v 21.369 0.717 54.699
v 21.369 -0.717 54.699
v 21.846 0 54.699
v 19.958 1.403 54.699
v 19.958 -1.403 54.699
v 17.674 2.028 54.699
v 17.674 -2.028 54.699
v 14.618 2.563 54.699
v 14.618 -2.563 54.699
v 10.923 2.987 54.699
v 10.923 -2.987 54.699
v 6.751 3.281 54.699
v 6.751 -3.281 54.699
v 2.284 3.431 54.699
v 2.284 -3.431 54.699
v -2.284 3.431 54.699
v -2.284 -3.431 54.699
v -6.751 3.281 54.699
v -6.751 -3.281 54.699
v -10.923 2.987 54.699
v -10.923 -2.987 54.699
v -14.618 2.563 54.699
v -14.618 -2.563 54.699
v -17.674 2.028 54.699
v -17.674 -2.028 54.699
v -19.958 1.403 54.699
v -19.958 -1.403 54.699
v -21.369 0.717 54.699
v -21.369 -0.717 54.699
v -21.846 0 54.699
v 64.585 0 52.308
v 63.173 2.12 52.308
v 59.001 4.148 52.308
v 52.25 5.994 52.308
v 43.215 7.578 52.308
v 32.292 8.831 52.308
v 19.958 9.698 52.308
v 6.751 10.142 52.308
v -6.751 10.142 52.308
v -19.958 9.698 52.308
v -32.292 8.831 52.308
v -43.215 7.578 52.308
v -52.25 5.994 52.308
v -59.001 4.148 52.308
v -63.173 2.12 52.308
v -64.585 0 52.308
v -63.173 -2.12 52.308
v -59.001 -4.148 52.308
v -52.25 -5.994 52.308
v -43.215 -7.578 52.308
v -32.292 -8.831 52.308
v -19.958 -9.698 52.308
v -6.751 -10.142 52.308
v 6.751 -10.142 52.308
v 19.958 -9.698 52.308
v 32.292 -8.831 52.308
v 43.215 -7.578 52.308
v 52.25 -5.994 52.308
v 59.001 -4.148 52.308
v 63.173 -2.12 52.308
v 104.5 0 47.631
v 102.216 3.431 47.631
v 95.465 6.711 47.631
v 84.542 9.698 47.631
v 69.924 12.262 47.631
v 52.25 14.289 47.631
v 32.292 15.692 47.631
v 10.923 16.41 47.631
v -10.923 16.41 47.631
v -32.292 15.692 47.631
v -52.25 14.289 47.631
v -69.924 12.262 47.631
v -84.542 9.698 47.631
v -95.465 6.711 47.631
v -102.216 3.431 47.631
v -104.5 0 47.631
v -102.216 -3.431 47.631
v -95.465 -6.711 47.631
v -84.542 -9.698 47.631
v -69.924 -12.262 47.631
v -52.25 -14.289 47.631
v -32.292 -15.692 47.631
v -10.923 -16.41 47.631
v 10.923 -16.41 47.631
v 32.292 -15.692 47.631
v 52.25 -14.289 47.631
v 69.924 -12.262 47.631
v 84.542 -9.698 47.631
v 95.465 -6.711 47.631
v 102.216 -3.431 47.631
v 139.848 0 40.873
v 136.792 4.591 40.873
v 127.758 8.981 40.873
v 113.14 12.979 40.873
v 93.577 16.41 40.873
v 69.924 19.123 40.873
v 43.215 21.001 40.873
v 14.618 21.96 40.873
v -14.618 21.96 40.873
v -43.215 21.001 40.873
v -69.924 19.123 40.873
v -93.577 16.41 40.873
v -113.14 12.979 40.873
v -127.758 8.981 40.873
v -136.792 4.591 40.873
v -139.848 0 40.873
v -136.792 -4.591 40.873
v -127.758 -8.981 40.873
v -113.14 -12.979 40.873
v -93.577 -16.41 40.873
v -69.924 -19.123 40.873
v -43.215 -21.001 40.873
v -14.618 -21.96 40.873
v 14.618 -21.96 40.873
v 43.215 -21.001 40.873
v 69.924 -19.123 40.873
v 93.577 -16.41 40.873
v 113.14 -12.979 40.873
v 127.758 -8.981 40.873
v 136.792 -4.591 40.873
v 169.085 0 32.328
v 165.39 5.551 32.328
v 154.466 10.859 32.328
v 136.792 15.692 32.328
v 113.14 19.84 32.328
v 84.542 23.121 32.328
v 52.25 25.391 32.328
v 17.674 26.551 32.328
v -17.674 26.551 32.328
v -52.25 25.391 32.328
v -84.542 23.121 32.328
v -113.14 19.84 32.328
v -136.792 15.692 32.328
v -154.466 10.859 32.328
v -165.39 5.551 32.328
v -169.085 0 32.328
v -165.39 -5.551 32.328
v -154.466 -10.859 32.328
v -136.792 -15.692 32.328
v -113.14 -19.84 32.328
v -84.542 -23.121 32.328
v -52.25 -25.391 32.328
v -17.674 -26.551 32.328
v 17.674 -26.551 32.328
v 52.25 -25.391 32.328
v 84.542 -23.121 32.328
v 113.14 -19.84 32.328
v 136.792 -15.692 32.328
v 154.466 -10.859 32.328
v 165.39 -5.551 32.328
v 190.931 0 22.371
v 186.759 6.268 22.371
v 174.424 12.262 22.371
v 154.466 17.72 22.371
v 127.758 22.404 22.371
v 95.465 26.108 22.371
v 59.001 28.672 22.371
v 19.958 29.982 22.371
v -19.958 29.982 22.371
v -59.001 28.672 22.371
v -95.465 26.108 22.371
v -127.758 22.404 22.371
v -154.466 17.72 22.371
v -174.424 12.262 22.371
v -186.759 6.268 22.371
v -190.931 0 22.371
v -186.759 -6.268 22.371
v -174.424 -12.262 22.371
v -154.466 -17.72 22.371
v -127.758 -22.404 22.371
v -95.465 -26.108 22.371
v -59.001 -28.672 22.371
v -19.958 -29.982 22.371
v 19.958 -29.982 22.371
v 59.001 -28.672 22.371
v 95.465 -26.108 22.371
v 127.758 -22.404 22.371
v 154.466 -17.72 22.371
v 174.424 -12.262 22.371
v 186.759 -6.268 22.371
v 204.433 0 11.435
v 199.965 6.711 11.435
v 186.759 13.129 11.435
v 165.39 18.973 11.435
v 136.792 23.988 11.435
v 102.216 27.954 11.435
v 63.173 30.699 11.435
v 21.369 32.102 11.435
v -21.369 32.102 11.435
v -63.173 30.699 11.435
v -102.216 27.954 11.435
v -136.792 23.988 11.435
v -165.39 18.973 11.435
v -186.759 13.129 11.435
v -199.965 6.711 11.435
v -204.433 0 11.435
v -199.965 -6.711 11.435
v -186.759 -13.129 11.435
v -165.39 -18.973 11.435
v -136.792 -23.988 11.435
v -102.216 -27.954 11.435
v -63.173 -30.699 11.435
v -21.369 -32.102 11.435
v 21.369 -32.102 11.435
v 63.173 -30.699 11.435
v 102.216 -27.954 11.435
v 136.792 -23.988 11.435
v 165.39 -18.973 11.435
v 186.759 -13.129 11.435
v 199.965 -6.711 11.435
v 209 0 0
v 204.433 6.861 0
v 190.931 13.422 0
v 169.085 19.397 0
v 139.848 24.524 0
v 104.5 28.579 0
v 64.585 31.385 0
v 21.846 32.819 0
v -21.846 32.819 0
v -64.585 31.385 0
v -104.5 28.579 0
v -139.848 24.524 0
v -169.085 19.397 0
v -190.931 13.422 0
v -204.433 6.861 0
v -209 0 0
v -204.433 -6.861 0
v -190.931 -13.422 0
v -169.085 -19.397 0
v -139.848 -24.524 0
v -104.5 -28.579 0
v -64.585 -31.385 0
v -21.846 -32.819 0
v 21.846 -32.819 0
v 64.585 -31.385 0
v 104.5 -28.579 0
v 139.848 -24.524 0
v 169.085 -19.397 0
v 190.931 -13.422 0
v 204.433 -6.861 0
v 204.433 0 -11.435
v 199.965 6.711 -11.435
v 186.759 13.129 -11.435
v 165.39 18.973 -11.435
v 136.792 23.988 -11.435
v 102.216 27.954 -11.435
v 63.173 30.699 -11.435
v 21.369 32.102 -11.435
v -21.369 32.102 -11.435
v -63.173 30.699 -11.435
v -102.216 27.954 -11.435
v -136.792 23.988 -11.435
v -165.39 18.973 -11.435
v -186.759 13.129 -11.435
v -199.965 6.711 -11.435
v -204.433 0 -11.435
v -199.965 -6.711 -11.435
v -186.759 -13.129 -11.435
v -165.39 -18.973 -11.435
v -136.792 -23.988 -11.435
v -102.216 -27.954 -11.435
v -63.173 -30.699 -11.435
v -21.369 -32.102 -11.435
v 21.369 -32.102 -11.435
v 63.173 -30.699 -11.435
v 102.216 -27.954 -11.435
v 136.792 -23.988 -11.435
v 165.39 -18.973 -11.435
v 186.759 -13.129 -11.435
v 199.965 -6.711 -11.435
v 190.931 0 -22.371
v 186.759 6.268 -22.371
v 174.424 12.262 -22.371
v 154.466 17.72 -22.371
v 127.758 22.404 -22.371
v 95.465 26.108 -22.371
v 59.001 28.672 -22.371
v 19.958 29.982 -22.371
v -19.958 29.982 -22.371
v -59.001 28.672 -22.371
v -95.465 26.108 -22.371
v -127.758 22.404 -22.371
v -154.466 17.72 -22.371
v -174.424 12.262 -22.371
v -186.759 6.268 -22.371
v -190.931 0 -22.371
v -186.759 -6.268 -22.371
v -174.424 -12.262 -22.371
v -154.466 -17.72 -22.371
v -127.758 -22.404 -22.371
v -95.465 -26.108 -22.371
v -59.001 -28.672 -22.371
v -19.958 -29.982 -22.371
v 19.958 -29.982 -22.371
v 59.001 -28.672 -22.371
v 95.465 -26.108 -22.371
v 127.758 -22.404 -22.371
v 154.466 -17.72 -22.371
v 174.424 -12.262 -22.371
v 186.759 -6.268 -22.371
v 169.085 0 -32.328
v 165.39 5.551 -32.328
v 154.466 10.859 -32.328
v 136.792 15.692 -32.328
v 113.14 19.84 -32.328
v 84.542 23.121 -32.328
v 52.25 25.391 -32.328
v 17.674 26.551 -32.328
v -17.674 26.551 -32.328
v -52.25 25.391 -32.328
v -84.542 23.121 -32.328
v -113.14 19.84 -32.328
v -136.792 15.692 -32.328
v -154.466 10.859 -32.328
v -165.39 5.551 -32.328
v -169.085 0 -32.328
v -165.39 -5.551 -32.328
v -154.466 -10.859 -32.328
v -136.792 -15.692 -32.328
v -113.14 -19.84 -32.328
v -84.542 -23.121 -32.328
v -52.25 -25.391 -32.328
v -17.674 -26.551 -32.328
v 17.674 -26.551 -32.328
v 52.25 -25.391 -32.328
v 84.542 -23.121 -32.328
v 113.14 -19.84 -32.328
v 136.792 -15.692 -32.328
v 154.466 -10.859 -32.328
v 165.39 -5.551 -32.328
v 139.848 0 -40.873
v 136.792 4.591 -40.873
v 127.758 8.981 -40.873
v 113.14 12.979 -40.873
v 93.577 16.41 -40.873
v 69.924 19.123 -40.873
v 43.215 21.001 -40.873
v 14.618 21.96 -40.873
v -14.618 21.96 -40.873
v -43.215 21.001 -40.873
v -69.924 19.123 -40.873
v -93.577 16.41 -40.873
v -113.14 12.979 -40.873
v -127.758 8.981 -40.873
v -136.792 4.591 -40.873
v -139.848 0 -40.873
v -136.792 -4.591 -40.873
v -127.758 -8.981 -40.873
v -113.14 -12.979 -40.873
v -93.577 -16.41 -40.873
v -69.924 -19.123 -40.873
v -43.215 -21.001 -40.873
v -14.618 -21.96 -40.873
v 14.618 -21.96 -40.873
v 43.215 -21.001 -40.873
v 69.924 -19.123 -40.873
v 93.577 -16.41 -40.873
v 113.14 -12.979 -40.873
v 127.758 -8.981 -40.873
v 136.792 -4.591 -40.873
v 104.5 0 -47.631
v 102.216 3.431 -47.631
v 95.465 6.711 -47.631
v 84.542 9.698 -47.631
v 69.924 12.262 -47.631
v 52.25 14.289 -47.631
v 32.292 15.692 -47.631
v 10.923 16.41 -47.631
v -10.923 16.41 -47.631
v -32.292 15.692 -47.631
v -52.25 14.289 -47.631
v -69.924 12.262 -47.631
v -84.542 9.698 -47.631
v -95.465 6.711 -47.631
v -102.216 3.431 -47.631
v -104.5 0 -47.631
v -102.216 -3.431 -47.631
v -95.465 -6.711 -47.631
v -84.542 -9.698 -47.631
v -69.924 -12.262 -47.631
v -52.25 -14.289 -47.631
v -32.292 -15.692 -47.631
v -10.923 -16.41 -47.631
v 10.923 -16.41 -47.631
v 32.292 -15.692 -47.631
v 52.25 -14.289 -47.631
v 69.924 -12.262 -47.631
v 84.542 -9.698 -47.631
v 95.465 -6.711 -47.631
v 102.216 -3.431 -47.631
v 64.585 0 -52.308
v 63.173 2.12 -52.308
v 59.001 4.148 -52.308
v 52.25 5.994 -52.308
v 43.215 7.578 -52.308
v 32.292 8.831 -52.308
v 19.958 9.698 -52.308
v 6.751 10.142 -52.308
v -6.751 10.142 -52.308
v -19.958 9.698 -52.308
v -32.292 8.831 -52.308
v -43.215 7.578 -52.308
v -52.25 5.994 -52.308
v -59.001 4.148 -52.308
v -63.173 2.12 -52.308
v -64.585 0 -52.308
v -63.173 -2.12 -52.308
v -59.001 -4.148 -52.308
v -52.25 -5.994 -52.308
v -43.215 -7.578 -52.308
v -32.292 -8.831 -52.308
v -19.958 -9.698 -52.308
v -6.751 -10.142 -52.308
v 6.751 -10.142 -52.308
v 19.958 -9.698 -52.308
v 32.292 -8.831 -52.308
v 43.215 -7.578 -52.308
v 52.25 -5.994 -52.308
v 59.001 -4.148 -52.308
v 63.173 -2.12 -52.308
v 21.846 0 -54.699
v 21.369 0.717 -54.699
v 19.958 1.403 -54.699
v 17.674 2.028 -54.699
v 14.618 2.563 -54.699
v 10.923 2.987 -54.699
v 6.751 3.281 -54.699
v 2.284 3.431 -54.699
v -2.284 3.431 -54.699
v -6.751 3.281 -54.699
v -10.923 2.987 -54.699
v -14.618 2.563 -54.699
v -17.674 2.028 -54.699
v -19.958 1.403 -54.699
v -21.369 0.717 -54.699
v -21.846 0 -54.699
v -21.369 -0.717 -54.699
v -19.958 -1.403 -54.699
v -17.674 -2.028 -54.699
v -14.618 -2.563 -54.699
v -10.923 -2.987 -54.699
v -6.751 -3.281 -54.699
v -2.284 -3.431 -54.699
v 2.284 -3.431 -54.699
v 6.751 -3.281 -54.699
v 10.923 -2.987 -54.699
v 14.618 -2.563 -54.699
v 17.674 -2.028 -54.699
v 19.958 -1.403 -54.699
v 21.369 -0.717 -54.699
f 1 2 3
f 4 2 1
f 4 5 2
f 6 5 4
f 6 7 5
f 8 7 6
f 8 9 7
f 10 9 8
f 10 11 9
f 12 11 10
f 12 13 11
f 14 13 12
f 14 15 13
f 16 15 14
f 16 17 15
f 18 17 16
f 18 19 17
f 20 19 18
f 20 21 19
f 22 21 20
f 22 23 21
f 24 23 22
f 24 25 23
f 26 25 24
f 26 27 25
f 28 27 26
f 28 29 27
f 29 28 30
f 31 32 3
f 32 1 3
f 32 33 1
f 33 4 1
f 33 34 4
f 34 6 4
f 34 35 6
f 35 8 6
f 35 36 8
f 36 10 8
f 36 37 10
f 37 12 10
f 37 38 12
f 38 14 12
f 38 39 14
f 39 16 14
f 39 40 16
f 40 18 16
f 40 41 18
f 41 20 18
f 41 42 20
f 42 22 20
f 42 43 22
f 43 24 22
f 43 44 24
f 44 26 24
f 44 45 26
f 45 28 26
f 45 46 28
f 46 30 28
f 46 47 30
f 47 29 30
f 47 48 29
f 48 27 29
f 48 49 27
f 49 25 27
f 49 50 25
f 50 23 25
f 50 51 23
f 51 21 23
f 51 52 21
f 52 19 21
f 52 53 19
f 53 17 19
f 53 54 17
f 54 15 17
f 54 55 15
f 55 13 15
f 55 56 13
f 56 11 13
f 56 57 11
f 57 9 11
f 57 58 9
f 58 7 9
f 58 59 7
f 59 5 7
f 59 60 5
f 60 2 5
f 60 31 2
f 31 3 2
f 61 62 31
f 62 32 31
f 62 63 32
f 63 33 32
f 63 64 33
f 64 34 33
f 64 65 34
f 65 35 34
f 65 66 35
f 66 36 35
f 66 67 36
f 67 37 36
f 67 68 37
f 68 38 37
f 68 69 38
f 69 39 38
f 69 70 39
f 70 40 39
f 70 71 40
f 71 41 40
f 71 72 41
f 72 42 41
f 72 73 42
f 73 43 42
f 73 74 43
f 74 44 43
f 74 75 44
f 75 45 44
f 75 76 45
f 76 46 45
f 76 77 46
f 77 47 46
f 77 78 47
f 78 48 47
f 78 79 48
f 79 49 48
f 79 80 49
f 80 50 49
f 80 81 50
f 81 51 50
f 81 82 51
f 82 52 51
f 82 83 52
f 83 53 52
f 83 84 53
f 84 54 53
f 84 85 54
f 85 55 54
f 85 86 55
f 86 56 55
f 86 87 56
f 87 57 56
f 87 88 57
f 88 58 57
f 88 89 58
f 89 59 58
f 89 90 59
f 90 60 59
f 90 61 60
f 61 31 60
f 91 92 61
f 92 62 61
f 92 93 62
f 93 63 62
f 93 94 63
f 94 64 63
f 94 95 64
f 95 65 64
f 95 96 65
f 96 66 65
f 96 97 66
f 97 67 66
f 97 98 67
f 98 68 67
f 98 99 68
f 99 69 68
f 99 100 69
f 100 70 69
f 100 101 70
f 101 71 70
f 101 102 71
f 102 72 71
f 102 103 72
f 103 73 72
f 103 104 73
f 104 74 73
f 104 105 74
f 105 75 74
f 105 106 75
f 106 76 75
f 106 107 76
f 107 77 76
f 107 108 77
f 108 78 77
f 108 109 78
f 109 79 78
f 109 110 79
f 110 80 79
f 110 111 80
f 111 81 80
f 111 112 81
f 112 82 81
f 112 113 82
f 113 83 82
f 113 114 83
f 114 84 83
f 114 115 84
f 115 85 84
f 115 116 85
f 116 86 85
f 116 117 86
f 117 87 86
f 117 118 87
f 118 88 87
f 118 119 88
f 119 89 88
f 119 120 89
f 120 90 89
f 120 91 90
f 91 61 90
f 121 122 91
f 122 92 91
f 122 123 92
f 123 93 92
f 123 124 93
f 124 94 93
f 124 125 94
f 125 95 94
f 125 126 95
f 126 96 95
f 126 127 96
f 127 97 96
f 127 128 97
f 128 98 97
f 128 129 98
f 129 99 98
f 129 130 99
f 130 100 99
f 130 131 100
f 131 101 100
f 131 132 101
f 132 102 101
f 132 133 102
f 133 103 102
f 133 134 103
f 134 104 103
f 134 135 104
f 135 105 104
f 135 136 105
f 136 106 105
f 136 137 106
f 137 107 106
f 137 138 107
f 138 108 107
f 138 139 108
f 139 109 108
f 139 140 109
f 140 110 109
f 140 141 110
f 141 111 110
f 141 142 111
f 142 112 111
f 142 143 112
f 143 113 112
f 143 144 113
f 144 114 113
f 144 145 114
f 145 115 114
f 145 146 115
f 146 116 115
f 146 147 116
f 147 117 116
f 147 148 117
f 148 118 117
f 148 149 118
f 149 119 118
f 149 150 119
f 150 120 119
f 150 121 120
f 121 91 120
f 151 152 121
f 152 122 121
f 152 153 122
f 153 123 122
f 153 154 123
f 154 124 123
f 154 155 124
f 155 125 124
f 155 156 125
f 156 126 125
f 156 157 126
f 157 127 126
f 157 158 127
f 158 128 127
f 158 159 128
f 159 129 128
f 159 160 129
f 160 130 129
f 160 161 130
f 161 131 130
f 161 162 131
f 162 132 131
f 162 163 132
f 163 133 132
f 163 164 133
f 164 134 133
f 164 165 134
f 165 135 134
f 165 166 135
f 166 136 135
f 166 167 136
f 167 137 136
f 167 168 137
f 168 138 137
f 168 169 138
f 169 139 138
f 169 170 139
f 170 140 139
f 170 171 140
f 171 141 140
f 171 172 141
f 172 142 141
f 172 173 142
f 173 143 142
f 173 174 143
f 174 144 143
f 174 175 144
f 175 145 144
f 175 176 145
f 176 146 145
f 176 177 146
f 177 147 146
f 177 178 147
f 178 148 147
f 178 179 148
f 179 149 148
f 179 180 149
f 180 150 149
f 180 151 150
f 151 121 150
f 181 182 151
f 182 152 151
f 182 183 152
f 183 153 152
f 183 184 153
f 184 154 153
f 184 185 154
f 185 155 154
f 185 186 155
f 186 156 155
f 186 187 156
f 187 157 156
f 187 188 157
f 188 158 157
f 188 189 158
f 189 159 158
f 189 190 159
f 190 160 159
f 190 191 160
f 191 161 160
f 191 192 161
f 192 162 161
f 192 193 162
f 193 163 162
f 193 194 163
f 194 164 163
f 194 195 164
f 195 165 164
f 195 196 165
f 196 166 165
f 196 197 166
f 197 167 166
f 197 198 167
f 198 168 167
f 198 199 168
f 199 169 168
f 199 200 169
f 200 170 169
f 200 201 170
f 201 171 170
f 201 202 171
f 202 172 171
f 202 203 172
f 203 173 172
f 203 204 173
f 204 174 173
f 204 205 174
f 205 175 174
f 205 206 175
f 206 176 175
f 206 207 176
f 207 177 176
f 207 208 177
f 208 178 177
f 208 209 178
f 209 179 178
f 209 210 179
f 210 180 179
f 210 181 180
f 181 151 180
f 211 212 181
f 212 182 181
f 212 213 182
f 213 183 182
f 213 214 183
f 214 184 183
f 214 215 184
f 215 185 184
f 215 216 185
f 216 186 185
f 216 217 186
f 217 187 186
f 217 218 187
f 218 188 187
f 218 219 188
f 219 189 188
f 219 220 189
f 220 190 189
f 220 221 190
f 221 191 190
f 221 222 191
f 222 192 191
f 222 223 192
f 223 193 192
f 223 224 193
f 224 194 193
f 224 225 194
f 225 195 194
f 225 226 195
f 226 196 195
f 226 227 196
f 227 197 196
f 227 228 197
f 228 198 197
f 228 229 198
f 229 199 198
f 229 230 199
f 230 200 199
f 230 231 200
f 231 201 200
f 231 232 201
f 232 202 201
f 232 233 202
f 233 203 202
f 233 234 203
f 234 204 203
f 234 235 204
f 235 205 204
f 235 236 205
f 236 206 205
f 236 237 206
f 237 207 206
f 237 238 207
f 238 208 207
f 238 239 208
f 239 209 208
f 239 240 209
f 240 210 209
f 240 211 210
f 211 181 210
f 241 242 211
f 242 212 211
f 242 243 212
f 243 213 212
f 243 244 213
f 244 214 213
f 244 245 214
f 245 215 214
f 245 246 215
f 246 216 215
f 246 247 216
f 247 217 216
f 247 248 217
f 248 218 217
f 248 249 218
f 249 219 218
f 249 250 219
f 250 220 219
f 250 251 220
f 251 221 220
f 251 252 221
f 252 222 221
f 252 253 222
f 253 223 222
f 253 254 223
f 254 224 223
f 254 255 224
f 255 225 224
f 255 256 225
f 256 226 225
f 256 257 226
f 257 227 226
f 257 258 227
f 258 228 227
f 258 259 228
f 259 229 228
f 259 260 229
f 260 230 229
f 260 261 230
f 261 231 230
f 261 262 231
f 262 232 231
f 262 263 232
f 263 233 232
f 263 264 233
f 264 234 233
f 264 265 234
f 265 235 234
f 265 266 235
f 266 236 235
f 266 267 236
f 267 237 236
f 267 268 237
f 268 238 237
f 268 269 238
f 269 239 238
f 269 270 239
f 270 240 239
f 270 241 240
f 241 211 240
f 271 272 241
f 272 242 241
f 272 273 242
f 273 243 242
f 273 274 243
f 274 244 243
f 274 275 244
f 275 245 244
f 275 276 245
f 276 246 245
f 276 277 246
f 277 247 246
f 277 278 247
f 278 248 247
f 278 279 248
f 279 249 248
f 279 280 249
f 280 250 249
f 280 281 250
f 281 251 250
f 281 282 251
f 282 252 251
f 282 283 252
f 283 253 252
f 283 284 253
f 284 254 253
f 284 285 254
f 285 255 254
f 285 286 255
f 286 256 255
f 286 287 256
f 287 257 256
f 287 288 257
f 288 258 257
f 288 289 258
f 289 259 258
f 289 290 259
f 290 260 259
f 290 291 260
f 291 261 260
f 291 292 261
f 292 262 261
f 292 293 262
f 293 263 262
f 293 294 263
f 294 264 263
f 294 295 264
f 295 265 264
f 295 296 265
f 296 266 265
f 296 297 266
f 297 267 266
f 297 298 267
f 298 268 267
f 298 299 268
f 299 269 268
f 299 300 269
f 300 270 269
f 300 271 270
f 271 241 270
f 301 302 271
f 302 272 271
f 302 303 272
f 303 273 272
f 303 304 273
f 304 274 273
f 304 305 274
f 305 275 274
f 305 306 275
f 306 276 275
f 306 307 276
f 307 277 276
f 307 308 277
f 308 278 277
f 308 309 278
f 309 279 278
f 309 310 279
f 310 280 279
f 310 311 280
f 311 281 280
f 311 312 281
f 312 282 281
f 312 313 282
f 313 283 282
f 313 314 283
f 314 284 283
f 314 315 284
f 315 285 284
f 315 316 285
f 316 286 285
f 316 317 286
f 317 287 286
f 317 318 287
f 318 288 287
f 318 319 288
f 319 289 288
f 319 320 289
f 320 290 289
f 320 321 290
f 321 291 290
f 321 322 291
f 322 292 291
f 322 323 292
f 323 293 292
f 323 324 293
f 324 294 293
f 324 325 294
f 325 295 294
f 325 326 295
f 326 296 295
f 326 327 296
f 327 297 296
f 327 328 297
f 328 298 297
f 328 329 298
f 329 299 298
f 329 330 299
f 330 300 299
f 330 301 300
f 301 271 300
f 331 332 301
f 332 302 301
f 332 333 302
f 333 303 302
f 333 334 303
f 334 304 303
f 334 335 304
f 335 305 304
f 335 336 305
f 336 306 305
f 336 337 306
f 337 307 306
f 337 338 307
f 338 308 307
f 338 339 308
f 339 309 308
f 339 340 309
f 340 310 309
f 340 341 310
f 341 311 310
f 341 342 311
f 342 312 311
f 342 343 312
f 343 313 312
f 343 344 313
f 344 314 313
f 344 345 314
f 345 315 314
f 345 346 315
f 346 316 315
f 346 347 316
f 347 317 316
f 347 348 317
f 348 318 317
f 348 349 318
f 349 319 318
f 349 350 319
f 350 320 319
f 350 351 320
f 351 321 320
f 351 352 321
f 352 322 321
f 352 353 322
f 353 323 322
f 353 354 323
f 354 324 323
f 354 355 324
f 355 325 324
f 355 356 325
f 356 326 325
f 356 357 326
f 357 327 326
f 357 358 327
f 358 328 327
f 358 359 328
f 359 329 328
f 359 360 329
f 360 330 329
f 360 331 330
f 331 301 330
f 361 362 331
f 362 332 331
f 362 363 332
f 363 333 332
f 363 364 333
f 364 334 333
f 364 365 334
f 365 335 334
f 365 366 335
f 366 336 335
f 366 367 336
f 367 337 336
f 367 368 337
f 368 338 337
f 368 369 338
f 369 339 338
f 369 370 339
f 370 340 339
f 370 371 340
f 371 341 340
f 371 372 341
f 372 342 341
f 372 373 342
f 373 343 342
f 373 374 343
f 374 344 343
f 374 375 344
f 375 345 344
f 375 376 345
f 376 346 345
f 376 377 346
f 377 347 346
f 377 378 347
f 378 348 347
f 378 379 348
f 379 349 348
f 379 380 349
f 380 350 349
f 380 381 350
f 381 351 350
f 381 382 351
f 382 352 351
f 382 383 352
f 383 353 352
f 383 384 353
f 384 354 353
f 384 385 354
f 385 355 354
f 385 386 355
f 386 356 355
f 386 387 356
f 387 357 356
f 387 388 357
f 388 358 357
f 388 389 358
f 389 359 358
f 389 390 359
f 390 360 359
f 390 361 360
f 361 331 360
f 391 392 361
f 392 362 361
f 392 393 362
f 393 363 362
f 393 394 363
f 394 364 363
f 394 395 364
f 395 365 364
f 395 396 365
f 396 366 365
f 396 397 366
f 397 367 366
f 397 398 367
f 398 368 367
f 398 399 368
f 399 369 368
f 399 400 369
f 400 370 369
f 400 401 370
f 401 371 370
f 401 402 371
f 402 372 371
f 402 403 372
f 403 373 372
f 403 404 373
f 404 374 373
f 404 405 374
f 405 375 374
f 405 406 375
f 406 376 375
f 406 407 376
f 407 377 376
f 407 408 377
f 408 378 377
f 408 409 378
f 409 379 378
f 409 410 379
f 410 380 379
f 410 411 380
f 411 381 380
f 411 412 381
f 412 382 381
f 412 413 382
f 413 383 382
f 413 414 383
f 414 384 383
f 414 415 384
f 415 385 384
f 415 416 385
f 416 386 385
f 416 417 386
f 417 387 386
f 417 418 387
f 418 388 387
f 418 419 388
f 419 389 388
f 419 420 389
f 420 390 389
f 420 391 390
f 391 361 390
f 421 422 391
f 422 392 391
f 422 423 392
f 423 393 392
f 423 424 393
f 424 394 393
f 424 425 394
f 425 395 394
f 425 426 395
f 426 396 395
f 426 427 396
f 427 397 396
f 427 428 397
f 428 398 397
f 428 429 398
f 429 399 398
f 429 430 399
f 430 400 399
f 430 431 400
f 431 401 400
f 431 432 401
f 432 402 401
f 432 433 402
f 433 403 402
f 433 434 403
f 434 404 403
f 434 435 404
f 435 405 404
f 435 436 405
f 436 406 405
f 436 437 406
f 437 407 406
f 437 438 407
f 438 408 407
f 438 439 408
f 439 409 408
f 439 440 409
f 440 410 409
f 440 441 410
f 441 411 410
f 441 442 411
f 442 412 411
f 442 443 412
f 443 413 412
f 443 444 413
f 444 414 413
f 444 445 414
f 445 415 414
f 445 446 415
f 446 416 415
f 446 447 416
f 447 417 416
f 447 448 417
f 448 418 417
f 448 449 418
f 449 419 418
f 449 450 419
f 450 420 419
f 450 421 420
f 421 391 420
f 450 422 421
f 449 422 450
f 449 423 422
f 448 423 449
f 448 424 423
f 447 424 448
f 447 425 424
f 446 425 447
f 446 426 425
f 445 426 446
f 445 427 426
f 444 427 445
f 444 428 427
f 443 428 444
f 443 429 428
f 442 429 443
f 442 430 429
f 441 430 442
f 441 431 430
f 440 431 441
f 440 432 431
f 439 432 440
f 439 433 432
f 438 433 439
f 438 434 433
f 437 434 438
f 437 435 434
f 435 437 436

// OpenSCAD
// Generated by SolidPython 1.0.1 on 2020-07-29 00:46:53


scale(v = [19, 3, 5]) {
	sphere(r = 11);
}
/***********************************************
*********      SolidPython code:      **********
************************************************
 
# import packages: SolidPython
from solid import *
from solid.utils import *
from itertools import chain, combinations, permutations


class Resize:

    def __init__(self, scad_file):
        self.scad_file = scad_file
        #self.scad_file = import_scad(scad_file)
        # cone/cylinder param:
        self.r1 = 0
        self.r2 = 0
        self.h = 0
        # rectangular prism param:
        self.w = 0
        self.l = 0
        # ellipse param:
        self.r = 0

    # import OpenScad code (file name corresponds to shape)


    # classify shape + parameters
    def assign(self, param1, param2, param3):
        if self.scad_file == 'cone.scad':
            self.r1 = param1
            self.r2 = param2
            self.h = param3
        elif self.scad_file == 'cylinder.scad':
            self.r1 = param1
            self.r2 = param2
            self.h = param3
        elif self.scad_file == 'rectangularPrism.scad':
            self.h = param1
            self.l = param2
            self.w = param3
        else:
            self.r = param1
            self.h = param2

    # resize parameters
    def iterate(self):
        x = range(3, 20, 2)
        i = 1
        if self.scad_file == 'cone.scad':
            tempList = list(permutations(x, 2))
            for temp in tempList:
                param1 = temp[0]
                param2 = temp[1]
                filepath = 'produced_scad_files/' + 'cone' + str(param1) + '_' + str(param2) + '_' + '.scad'
                scad_render_to_file(cylinder(h=param1, r1=param2, r2=0), filepath)

        elif self.scad_file == 'cylinder.scad':
            tempList = list(permutations(x, 3))
            for temp in tempList:
                param1 = temp[0]
                param2 = temp[1]
                filepath = 'produced_scad_files/' + 'cylinder' + str(param1) + '_' + str(param2) + '_' + '.scad'
                scad_render_to_file(cylinder(h=param1, r1=param2, r2=param2), filepath)

        elif self.scad_file == 'rectangularPrism.scad':
            tempList = list(permutations(x, 3))
            for temp in tempList:
                param1 = temp[0]
                param2 = temp[1]
                param3 = temp[2]
                filepath = 'produced_scad_files/' + 'rectangularPrism' + str(param1) + '_' + str(param2) + '_' + str(
                    param3) + '.scad'
                scad_render_to_file(cube(size=(param1, param2, param3)), filepath)

        elif self.scad_file == 'ellipse.scad':
            tempList = list(permutations(x, 4))
            for temp in tempList:
                param1 = temp[0]
                param2 = temp[1]
                param3 = temp[2]
                param4 = temp[3]
                filepath = 'produced_scad_files/' + 'ellipse' + str(param1) + '_' + str(param2) + '_' + str(param3) + '_' + str(param4) + '.scad'
                scad_render_to_file(scale([param1, param2, param3])(sphere(r=param4)), filepath)

    def render_to_scadfile(self):
        scad_render_to_file(scad, 'example.scad') 
 
************************************************/
